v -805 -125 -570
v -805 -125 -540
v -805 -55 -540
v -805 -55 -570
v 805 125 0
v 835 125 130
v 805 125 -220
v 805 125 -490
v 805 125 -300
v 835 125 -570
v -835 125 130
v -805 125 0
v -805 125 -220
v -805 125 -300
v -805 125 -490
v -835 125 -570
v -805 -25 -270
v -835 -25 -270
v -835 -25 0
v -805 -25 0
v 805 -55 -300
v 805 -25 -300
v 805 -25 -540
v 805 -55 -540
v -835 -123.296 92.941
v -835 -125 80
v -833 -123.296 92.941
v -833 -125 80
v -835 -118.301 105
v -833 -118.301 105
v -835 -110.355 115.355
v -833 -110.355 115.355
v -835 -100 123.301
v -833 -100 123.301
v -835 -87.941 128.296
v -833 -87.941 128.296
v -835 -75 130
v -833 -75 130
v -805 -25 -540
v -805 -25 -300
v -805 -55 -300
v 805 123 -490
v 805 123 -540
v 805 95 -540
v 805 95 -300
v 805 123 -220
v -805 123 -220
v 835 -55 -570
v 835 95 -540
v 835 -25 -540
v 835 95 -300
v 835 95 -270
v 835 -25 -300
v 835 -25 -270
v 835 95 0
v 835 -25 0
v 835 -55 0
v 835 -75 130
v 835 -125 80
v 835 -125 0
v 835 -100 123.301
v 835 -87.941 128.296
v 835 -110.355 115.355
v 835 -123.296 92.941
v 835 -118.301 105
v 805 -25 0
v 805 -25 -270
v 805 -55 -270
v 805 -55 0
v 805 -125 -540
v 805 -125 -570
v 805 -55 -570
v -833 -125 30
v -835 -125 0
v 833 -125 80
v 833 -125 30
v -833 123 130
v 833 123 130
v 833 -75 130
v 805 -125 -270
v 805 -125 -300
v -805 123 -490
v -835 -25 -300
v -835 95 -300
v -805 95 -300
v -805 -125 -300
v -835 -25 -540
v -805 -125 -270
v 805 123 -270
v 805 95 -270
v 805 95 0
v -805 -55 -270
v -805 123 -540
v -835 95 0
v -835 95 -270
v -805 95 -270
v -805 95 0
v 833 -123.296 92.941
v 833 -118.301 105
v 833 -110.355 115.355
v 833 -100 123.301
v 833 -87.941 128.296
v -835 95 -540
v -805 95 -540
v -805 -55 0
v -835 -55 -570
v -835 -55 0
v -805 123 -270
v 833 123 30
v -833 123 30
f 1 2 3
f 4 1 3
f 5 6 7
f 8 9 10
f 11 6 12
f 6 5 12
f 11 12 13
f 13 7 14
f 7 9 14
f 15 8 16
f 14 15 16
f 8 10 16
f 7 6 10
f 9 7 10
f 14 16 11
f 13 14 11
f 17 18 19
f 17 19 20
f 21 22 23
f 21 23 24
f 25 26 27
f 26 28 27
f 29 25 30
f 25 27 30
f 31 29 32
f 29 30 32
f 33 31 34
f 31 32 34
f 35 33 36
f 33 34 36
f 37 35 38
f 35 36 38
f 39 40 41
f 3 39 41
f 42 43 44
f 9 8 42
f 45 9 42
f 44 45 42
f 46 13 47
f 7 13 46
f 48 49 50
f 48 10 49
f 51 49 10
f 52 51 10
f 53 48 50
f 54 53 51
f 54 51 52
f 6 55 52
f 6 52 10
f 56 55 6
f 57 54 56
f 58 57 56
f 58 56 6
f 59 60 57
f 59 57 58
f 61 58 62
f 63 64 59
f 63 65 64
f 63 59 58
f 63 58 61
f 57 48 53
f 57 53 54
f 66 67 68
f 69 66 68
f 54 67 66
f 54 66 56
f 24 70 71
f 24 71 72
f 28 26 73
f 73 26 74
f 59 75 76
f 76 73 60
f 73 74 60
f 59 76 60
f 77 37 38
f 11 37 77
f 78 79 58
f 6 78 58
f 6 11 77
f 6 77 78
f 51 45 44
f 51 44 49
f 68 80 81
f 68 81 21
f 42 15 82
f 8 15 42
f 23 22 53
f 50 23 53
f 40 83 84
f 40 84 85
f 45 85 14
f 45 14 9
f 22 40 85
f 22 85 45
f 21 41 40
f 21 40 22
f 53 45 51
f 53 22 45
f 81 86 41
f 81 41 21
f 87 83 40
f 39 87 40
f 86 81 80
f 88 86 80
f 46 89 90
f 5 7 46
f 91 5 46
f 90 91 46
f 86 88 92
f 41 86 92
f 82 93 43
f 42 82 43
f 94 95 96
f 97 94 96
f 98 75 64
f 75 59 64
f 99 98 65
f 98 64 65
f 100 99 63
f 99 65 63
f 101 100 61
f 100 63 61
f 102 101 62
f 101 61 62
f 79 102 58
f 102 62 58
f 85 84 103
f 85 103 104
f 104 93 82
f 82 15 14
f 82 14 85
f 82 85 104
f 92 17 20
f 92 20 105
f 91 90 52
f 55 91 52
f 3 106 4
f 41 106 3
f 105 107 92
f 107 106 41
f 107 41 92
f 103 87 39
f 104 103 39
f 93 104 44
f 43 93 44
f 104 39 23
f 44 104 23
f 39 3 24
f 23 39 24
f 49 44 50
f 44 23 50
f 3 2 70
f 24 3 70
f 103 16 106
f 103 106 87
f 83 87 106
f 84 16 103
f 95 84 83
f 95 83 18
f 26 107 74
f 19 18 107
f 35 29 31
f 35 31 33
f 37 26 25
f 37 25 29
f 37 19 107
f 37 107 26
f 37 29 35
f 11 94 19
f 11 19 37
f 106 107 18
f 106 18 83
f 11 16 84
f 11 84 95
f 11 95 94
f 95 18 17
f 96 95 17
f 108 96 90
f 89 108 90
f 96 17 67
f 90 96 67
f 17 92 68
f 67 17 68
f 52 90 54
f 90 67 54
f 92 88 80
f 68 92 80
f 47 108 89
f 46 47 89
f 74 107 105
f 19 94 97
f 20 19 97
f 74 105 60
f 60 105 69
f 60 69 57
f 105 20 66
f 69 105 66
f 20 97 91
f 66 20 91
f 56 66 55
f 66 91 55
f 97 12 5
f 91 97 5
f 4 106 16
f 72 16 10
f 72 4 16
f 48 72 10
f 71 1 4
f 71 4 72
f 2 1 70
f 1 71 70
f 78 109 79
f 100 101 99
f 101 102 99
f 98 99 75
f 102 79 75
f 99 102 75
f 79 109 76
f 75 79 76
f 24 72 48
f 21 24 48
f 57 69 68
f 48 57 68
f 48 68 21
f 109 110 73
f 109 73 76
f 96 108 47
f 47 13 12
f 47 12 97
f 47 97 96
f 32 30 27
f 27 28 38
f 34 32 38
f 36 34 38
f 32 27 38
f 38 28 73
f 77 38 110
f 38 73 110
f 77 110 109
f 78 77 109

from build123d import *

# Parameters (mm, degrees)
F0_W           = 1670
F0_H           = 250
F1_DEPTH       = 30
F2_W           = 30
F2_H           = 30
F3_DEPTH       = 570
F4_W           = 250
F4_H           = 30
F5_DEPTH       = 805
F5_DEPTH_BACK  = 805
F7_DEPTH       = 100
F8_R           = 50
F9_W           = 1610
F9_H           = 2
F10_DEPTH      = 50
F11_W          = 1610
F11_H          = 2
F12_DEPTH      = 50
F13_W          = 30
F13_H          = 30
F14_DEPTH      = 25
F14_DEPTH_BACK = 95


with BuildPart() as f1:
    # F0 (on Top) → F1 (new body)
    with BuildSketch(Plane.XY):
        Rectangle(F0_W, F0_H)
    extrude(amount=F1_DEPTH)

    # F2 (on face) → F3 (join)
    with BuildSketch(Plane(origin=(0, 0, 0), x_dir=(1, 0, 0), z_dir=(0, 0, -1))):
        with Locations((-820, 40)):
            Rectangle(F2_W, F2_H)
        with Locations((820, 40)):
            Rectangle(F2_W, F2_H)
        with Locations((820, -110)):
            Rectangle(F2_W, F2_H)
        with Locations((-820, -110)):
            Rectangle(F2_W, F2_H)
    extrude(amount=F3_DEPTH)

    # F4 (on Right) → F5 (join, two sides)
    with BuildSketch(Plane.YZ) as f5_sk:
        with Locations((0, -285)):
            Rectangle(F4_W, F4_H)
        with Locations((0, -555)):
            Rectangle(F4_W, F4_H)
    extrude(amount=F5_DEPTH)
    extrude(f5_sk.sketch, amount=-F5_DEPTH_BACK)

    # F6 (on face) → F7 (join)
    with BuildSketch(Plane.XY.offset(30)):
        Polygon((-835, 125), (-835, -125), (-833, -125), (-833, 123), (833, 123), (833, -125), (835, -125), (835, 125), align=None)
    extrude(amount=F7_DEPTH)

    # F8
    f8_edges = [f1.edges().sort_by_distance(p)[0] for p in [
        (-834, -125, 130),
        (834, -125, 130),
    ]]
    fillet(f8_edges, radius=F8_R)

    # F9 (on face) → F10 (join)
    with BuildSketch(Plane.XY.offset(-270)):
        with Locations((0, 124)):
            Rectangle(F9_W, F9_H)
    extrude(amount=F10_DEPTH)

    # F11 (on face) → F12 (join)
    with BuildSketch(Plane.XY.offset(-540)):
        with Locations((0, 124)):
            Rectangle(F11_W, F11_H)
    extrude(amount=F12_DEPTH)

    # F13 (on Front) → F14 (join, two sides)
    with BuildSketch(Plane.XZ) as f14_sk:
        with Locations((820, -285)):
            Rectangle(F13_W, F13_H)
        with Locations((820, -555)):
            Rectangle(F13_W, F13_H)
        with Locations((-820, -555)):
            Rectangle(F13_W, F13_H)
        with Locations((-820, -285)):
            Rectangle(F13_W, F13_H)
    extrude(amount=F14_DEPTH)
    extrude(f14_sk.sketch, amount=-F14_DEPTH_BACK)


solid = f1.part
